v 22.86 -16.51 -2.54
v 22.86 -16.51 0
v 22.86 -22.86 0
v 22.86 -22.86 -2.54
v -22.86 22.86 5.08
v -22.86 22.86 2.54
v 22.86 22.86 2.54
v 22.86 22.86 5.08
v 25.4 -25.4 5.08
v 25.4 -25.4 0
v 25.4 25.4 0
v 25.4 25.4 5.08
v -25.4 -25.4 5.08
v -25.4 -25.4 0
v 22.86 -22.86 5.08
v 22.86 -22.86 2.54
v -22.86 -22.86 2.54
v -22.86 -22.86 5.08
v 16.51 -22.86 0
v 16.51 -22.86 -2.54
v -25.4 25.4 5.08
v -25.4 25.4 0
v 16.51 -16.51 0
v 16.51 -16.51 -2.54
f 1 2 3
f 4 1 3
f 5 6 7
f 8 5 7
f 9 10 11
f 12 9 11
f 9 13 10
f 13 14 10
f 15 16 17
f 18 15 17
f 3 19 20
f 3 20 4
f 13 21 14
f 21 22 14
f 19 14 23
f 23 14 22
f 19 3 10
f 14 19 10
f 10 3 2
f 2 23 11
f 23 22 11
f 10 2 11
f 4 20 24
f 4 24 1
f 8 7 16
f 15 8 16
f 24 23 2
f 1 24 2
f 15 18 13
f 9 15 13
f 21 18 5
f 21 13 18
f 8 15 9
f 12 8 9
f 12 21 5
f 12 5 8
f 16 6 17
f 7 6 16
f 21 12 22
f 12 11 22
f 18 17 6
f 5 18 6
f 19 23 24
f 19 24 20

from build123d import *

# Parameters (mm, degrees)
F0_W     = 50.8
F0_H     = 50.8
F1_DEPTH = 2.54
F2_W     = 2.54
F2_H     = 45.72
F3_DEPTH = 2.54
F4_W     = 6.35
F4_H     = 6.35
F5_DEPTH = 2.54


with BuildPart() as f1:
    # F0 (on Top) → F1 (new body)
    with BuildSketch(Plane.XY):
        Rectangle(F0_W, F0_H)
    extrude(amount=F1_DEPTH)

    # F2 (on face) → F3 (join)
    with BuildSketch(Plane.XY.offset(2.54)):
        with Locations((-24.13, 0)):
            Rectangle(F2_W, F2_H)
        Polygon((25.4, 25.4), (-25.4, 25.4), (-25.4, 22.86), (-22.86, 22.86), (22.86, 22.86), (25.4, 22.86), align=None)
        Polygon((25.4, -25.4), (25.4, 22.86), (22.86, 22.86), (22.86, -22.86), (22.86, -25.4), align=None)
        Polygon((-22.86, -22.86), (-25.4, -22.86), (-25.4, -25.4), (22.86, -25.4), (22.86, -22.86), align=None)
    extrude(amount=F3_DEPTH)

    # F4 (on face) → F5 (join)
    with BuildSketch(Plane(origin=(0, 0, 0), x_dir=(1, 0, 0), z_dir=(0, 0, -1))):
        with Locations((19.685, 19.685)):
            Rectangle(F4_W, F4_H)
    extrude(amount=F5_DEPTH)


solid = f1.part
